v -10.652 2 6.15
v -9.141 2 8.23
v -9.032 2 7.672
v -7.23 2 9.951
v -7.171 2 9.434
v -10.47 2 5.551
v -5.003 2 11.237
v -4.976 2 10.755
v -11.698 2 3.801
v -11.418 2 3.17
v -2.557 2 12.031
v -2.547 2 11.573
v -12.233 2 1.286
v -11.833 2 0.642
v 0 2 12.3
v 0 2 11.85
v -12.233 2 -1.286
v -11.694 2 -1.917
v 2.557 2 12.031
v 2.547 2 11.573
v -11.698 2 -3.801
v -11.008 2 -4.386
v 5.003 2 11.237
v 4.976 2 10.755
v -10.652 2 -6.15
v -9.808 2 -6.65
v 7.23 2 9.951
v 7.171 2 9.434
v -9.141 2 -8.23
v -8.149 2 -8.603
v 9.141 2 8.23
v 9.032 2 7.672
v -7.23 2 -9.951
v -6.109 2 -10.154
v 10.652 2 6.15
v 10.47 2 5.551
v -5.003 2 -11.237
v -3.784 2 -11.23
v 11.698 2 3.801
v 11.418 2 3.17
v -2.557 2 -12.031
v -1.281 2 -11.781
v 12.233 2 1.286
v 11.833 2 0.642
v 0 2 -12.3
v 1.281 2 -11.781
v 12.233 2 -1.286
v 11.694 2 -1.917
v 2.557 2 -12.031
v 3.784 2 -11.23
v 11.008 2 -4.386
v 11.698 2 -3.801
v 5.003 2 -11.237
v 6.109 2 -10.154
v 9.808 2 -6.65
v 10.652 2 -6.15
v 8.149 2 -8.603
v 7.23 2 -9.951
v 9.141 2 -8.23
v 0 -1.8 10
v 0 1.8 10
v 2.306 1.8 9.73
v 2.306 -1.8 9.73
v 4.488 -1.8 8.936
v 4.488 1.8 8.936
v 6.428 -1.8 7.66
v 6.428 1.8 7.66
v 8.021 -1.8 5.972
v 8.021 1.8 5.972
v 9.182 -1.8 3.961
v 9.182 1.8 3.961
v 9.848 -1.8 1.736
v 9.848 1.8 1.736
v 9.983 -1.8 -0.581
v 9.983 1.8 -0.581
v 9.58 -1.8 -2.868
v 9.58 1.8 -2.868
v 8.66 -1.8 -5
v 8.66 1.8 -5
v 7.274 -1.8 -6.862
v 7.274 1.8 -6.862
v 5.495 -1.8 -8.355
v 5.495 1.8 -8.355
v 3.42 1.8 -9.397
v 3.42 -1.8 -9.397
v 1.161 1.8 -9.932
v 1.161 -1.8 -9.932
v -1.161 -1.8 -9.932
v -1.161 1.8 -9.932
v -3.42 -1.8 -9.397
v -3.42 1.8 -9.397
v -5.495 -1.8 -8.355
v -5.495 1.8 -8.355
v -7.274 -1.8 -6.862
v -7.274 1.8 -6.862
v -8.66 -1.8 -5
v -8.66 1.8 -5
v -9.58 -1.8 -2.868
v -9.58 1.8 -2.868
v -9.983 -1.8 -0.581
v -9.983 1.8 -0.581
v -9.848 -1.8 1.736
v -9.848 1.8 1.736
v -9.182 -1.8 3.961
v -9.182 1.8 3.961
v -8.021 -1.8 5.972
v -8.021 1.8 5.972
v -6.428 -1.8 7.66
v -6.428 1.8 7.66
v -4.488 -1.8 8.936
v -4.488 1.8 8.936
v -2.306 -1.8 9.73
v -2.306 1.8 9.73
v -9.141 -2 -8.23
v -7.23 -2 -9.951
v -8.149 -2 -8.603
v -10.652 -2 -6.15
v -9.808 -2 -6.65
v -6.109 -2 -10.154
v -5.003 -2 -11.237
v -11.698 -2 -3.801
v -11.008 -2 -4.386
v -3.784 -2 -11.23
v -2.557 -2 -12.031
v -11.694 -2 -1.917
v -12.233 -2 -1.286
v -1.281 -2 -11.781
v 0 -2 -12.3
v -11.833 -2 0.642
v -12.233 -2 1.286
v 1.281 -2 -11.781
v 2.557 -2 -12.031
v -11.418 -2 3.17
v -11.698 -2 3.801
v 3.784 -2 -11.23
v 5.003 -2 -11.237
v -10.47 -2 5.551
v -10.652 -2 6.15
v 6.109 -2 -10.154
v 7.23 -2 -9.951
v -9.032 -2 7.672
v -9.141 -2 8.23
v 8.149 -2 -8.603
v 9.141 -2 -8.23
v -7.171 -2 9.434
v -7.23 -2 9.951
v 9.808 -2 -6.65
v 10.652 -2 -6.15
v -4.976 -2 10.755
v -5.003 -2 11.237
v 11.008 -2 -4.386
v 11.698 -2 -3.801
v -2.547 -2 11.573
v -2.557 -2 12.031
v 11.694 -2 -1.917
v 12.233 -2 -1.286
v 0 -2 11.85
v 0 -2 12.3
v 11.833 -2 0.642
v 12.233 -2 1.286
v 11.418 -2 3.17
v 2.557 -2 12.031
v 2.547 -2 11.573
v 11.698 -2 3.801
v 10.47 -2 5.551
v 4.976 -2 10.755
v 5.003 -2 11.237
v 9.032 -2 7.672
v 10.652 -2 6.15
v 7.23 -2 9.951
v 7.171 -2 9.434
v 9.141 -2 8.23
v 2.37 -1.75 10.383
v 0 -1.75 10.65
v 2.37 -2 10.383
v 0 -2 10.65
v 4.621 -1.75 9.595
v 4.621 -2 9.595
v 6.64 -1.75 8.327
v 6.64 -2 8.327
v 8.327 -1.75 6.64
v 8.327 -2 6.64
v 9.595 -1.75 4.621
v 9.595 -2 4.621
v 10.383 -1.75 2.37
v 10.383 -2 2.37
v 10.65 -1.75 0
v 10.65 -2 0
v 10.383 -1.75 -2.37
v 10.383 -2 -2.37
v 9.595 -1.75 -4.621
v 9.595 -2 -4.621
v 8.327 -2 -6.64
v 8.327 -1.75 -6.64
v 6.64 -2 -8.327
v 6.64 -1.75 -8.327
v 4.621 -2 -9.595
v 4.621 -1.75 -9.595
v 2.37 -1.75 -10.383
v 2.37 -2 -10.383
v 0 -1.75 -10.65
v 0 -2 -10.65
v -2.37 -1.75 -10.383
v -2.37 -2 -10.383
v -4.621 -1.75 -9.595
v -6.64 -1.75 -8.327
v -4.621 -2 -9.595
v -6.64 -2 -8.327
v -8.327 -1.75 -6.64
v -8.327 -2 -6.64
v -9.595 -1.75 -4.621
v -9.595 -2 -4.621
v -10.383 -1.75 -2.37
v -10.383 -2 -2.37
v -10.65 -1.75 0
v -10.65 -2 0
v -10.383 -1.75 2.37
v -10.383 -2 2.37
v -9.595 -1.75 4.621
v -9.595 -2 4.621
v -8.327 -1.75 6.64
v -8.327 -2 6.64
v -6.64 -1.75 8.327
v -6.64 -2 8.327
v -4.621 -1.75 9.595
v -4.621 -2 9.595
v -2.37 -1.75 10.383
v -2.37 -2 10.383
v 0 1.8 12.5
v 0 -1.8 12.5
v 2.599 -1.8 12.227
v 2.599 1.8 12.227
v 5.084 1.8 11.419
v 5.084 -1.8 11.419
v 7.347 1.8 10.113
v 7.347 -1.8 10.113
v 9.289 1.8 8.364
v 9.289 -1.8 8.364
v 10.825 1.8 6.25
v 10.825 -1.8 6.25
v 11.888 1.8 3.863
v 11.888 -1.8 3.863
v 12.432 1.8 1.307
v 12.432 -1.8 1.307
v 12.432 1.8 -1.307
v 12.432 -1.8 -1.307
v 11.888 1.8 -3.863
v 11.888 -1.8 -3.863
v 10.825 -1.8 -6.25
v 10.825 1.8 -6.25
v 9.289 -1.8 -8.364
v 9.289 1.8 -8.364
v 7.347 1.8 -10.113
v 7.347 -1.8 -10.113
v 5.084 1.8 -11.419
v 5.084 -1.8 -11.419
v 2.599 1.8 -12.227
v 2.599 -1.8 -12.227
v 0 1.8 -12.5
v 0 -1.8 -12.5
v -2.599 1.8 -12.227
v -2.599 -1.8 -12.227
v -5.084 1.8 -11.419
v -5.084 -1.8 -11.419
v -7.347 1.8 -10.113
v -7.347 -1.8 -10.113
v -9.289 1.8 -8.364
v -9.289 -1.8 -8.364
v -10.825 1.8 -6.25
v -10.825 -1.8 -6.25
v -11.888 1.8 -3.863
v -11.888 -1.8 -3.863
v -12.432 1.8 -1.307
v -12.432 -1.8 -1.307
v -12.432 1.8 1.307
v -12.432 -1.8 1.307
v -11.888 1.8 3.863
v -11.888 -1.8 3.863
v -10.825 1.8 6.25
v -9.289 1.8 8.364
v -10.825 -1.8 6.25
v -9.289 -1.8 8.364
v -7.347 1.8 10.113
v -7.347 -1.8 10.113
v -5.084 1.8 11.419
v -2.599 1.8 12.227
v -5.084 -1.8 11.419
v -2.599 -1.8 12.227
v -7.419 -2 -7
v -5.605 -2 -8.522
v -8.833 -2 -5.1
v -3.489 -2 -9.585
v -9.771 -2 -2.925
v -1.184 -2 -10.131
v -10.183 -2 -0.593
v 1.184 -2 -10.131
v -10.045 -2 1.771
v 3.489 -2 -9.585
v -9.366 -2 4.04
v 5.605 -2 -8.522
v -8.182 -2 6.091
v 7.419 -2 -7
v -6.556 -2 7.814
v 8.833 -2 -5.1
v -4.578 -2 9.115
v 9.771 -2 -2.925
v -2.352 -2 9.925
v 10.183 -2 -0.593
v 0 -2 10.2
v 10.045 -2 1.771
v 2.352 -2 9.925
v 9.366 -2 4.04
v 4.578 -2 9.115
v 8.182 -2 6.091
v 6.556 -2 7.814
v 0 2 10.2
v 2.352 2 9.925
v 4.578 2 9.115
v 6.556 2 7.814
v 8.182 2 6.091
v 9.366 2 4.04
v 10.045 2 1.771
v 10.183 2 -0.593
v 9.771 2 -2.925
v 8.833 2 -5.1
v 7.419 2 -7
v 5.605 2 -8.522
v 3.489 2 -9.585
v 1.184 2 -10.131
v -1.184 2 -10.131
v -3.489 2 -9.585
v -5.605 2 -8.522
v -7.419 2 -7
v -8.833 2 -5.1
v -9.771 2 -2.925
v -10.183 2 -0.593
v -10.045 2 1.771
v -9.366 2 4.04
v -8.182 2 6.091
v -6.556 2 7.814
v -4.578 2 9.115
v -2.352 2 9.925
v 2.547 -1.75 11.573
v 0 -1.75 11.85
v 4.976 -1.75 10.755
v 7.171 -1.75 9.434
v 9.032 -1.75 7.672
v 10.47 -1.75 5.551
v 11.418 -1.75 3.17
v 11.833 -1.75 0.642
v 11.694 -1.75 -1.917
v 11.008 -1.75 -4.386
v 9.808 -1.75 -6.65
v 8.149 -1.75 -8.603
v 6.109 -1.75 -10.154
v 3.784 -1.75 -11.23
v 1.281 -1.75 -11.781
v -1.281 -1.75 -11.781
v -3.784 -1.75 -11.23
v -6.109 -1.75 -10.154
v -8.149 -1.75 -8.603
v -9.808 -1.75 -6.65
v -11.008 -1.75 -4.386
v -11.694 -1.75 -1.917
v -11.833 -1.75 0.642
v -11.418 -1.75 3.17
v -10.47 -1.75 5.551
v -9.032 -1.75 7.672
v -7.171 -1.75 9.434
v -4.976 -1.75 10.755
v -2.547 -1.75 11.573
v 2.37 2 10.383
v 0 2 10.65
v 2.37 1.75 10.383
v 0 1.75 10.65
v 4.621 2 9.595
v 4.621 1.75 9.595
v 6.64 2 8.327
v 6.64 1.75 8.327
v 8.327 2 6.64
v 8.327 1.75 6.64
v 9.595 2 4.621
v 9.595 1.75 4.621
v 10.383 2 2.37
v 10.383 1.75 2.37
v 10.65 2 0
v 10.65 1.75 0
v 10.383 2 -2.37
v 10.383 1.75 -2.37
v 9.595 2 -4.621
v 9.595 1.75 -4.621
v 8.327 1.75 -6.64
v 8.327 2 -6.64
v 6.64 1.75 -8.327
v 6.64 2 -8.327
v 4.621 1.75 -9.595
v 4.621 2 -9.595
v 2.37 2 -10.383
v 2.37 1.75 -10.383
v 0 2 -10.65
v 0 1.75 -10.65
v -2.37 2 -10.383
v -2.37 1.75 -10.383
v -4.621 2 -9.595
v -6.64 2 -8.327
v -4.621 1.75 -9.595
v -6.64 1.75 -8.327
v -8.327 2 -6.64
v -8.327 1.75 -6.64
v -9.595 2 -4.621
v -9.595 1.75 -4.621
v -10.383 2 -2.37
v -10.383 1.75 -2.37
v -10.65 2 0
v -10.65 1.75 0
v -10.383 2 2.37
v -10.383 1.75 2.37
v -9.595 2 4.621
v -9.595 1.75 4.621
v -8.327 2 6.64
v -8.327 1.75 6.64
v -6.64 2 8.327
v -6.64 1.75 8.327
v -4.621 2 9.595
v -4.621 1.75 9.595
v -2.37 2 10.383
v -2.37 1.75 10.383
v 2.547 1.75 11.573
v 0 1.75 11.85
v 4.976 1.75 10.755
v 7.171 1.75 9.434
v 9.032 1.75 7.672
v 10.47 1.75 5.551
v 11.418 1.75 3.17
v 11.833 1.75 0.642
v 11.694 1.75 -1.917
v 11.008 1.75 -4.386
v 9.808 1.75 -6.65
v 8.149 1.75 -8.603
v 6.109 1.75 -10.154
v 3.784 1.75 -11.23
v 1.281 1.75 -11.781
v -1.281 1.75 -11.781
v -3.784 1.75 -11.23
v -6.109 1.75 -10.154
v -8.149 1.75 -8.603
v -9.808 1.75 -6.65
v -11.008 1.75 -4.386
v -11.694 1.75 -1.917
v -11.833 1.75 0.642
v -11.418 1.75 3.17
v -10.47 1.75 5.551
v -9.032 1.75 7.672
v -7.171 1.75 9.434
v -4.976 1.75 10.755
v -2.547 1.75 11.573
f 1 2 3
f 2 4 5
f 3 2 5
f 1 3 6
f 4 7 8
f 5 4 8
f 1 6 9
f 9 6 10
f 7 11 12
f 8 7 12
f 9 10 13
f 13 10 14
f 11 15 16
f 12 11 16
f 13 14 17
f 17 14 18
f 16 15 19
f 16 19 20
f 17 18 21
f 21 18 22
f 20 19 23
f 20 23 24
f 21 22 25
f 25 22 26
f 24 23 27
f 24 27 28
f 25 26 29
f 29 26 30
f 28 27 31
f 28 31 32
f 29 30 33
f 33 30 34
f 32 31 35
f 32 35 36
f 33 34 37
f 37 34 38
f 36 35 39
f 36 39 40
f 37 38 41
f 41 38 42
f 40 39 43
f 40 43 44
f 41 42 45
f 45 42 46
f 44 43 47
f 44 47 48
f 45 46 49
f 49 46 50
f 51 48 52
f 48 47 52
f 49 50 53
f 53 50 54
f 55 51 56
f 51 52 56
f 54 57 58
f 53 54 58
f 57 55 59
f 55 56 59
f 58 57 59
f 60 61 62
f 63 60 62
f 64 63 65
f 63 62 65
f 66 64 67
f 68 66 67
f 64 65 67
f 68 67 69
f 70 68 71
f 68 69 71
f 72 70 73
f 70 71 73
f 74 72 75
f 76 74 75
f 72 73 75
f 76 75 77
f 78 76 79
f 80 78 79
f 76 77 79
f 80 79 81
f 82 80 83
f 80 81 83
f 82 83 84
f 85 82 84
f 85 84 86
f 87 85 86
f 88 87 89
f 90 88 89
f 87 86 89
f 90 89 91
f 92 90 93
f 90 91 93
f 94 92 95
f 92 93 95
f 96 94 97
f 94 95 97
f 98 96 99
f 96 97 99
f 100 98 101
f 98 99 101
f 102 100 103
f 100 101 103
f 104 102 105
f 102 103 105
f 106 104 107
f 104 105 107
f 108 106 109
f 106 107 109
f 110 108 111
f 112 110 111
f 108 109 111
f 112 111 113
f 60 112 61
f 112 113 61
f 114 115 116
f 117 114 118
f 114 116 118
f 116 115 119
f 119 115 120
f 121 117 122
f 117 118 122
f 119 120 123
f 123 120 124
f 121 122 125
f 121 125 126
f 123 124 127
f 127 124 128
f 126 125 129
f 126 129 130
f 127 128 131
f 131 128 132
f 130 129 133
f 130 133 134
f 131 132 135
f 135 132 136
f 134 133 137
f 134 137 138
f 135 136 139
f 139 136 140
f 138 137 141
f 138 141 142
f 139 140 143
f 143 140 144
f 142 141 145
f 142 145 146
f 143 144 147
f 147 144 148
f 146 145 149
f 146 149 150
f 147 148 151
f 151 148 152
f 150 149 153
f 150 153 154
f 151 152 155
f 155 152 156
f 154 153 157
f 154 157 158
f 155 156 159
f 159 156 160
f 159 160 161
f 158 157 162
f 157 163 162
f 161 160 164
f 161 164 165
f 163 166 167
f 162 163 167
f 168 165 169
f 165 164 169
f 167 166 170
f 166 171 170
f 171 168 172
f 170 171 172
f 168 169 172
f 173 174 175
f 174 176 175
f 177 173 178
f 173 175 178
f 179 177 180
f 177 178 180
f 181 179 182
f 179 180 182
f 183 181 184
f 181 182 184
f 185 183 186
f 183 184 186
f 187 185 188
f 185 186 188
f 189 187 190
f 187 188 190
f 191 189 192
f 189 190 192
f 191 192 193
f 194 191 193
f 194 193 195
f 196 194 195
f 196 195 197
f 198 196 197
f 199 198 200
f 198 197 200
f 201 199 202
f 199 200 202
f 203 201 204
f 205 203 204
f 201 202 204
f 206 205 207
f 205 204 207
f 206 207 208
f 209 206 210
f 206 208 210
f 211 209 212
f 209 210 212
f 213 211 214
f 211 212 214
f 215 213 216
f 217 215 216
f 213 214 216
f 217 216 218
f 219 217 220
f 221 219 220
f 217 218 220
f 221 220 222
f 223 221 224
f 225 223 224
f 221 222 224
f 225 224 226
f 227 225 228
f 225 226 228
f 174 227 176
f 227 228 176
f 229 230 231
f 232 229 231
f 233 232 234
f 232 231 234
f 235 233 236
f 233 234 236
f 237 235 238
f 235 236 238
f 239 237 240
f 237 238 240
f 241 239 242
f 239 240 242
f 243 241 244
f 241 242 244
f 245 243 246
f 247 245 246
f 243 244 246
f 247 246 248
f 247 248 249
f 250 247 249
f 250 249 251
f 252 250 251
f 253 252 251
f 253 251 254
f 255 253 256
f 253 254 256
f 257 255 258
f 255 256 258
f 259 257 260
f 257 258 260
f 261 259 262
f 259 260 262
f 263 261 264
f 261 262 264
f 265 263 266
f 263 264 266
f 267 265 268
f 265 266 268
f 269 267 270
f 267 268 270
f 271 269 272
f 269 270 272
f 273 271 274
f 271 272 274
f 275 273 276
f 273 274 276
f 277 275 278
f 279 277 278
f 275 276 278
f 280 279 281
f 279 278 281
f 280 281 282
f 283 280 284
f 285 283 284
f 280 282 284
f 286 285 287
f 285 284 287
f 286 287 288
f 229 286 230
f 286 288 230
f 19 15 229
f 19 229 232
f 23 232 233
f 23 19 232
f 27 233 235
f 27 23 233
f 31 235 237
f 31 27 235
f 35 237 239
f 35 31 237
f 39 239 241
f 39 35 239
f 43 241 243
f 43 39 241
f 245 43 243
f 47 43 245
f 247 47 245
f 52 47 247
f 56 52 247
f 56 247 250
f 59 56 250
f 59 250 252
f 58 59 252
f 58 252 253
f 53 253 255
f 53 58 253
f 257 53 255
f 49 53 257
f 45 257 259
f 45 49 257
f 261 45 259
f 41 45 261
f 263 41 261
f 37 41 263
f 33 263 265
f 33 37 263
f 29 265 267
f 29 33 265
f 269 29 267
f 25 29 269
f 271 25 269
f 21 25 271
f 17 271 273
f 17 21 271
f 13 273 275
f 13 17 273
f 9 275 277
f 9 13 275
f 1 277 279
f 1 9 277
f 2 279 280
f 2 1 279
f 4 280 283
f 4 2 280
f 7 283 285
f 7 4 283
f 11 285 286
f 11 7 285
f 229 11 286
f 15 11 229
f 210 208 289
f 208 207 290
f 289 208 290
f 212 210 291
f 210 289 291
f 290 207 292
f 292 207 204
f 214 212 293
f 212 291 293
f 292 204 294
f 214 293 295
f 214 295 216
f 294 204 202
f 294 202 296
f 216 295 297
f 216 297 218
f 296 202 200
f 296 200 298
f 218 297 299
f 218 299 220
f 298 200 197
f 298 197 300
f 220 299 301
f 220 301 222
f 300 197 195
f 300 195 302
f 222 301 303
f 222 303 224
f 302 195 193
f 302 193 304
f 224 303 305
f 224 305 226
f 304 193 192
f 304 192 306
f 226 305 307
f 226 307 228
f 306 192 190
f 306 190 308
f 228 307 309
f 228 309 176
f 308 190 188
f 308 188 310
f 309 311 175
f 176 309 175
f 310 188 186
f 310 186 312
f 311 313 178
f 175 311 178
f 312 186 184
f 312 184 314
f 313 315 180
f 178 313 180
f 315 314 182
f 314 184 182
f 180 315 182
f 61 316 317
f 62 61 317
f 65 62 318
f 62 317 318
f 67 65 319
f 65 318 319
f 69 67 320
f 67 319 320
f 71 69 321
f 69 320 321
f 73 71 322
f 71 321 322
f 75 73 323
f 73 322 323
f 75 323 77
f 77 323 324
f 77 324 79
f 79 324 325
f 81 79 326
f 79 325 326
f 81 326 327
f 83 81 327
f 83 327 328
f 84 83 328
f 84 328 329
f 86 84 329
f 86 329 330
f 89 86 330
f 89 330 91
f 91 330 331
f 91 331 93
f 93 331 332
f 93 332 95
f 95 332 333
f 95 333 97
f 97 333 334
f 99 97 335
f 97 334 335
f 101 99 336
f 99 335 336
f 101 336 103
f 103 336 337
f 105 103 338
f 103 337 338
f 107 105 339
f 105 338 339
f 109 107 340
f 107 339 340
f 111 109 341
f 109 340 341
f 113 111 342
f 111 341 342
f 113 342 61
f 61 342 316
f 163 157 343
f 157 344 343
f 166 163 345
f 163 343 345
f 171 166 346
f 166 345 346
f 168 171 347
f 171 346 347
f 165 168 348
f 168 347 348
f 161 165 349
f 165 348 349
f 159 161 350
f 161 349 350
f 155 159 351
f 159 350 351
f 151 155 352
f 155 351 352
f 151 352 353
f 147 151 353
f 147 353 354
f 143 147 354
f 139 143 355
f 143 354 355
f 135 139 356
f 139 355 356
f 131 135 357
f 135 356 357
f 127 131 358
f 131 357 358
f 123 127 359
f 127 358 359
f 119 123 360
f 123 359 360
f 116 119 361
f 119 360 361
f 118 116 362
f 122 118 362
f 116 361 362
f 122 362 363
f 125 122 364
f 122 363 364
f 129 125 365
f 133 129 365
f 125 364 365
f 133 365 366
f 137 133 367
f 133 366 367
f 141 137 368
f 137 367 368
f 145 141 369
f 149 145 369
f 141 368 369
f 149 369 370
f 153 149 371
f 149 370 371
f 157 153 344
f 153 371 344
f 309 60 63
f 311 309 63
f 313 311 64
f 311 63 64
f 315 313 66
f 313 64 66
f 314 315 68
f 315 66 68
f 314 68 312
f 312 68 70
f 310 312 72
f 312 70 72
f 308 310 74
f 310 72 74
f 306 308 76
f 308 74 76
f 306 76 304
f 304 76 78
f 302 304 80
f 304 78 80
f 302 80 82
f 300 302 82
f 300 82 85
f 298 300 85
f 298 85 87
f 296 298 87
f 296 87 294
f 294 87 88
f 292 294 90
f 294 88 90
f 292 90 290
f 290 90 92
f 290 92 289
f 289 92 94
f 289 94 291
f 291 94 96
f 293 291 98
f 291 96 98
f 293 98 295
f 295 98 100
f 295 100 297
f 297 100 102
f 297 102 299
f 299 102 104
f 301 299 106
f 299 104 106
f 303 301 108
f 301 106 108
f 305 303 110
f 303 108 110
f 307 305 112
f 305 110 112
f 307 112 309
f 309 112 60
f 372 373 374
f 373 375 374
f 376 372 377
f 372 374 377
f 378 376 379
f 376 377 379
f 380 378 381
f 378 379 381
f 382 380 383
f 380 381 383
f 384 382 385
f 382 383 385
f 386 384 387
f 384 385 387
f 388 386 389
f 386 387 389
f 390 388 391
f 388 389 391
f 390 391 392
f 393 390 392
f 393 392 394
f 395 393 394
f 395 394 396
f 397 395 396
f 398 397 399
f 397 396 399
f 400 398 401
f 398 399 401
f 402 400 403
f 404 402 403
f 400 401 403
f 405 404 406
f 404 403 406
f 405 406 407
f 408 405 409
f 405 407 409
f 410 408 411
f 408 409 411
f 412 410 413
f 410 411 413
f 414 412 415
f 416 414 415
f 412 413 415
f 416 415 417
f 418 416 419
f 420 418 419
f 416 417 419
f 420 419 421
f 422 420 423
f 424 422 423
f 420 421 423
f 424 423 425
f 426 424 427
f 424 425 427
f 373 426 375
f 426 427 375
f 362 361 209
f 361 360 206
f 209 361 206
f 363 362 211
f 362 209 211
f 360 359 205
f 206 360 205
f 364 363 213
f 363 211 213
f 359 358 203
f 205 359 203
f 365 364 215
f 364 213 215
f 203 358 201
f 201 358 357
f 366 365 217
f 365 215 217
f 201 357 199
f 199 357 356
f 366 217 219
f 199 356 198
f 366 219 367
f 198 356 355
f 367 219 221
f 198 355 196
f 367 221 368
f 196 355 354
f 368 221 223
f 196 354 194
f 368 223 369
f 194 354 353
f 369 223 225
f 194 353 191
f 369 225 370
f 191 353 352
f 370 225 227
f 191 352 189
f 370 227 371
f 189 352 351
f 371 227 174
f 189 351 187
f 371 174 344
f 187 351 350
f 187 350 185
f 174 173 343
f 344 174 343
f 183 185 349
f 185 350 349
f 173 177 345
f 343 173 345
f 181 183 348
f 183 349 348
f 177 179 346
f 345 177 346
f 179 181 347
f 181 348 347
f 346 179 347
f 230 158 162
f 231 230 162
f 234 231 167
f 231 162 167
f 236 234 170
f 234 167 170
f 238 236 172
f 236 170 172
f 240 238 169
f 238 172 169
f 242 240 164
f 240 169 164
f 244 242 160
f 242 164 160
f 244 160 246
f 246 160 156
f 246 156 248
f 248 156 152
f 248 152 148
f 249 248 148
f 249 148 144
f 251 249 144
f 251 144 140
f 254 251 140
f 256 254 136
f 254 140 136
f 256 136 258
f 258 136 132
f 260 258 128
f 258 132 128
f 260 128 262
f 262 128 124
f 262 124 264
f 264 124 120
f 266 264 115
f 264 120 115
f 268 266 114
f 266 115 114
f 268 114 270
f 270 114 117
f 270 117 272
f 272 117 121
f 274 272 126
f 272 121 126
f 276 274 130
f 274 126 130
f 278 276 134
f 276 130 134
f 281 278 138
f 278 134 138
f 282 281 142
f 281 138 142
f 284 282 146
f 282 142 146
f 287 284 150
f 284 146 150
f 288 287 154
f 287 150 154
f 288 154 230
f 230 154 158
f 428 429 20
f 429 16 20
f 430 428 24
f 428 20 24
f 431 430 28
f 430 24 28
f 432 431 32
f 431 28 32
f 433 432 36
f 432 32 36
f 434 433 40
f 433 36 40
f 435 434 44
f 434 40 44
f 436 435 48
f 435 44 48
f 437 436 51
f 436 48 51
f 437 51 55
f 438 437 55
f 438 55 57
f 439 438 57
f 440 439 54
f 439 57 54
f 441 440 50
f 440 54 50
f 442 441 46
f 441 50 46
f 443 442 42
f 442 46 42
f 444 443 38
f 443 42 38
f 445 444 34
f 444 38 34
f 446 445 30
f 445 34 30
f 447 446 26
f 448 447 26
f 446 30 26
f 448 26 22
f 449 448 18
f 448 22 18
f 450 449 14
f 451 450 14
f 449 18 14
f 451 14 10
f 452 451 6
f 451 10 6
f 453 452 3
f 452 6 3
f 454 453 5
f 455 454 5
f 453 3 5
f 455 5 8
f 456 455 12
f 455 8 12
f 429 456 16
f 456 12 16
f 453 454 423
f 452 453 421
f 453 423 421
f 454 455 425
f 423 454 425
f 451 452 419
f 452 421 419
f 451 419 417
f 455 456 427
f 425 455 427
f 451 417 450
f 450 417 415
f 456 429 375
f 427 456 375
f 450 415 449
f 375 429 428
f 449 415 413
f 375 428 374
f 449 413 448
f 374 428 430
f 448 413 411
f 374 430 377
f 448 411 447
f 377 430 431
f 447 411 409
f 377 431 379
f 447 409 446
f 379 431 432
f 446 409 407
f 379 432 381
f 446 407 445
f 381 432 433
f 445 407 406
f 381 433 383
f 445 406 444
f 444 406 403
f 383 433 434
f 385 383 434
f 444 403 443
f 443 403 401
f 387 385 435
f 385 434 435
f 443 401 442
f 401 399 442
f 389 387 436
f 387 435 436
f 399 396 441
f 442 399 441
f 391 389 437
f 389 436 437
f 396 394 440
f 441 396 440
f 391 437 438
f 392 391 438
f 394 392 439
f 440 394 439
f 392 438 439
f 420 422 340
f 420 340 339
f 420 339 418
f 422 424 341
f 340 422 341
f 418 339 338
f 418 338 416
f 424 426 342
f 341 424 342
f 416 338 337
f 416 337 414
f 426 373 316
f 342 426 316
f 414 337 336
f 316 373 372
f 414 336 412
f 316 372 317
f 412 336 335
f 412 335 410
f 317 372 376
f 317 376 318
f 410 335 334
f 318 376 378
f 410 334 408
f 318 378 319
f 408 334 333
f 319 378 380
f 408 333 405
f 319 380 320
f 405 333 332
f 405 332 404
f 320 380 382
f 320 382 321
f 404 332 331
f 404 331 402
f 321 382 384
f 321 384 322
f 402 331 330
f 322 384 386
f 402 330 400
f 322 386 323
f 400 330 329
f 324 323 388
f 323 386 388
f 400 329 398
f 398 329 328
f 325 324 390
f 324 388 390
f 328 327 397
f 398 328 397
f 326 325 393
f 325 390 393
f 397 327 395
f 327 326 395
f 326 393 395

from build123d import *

# Parameters (mm, degrees)
FASE1_SIZE = 0.2


with BuildPart() as part:
    # Skizze2 → Rotation2 (revolve)
    with BuildSketch(Plane(origin=(0, 0, 0), x_dir=(0, 0, -1), z_dir=(1, 0, 0))):
        Polygon((-12.5, 2), (-12.5, -2), (-11.85, -2), (-11.85, -1.75), (-10.65, -1.75), (-10.65, -2), (-10, -2), (-10, 2), (-10.65, 2), (-10.65, 1.75), (-11.85, 1.75), (-11.85, 2), align=None)
    revolve(axis=Axis((0, -18.122913865, 0), (0, 1, 0)))

    # Fase1
    fase1_edges = [part.edges().sort_by_distance(p)[0] for p in [
        (0, 2, -10),
        (0, -2, -10),
        (0, -2, -12.5),
        (0, 2, -12.5),
    ]]
    chamfer(fase1_edges, length=FASE1_SIZE)


solid = part.part
